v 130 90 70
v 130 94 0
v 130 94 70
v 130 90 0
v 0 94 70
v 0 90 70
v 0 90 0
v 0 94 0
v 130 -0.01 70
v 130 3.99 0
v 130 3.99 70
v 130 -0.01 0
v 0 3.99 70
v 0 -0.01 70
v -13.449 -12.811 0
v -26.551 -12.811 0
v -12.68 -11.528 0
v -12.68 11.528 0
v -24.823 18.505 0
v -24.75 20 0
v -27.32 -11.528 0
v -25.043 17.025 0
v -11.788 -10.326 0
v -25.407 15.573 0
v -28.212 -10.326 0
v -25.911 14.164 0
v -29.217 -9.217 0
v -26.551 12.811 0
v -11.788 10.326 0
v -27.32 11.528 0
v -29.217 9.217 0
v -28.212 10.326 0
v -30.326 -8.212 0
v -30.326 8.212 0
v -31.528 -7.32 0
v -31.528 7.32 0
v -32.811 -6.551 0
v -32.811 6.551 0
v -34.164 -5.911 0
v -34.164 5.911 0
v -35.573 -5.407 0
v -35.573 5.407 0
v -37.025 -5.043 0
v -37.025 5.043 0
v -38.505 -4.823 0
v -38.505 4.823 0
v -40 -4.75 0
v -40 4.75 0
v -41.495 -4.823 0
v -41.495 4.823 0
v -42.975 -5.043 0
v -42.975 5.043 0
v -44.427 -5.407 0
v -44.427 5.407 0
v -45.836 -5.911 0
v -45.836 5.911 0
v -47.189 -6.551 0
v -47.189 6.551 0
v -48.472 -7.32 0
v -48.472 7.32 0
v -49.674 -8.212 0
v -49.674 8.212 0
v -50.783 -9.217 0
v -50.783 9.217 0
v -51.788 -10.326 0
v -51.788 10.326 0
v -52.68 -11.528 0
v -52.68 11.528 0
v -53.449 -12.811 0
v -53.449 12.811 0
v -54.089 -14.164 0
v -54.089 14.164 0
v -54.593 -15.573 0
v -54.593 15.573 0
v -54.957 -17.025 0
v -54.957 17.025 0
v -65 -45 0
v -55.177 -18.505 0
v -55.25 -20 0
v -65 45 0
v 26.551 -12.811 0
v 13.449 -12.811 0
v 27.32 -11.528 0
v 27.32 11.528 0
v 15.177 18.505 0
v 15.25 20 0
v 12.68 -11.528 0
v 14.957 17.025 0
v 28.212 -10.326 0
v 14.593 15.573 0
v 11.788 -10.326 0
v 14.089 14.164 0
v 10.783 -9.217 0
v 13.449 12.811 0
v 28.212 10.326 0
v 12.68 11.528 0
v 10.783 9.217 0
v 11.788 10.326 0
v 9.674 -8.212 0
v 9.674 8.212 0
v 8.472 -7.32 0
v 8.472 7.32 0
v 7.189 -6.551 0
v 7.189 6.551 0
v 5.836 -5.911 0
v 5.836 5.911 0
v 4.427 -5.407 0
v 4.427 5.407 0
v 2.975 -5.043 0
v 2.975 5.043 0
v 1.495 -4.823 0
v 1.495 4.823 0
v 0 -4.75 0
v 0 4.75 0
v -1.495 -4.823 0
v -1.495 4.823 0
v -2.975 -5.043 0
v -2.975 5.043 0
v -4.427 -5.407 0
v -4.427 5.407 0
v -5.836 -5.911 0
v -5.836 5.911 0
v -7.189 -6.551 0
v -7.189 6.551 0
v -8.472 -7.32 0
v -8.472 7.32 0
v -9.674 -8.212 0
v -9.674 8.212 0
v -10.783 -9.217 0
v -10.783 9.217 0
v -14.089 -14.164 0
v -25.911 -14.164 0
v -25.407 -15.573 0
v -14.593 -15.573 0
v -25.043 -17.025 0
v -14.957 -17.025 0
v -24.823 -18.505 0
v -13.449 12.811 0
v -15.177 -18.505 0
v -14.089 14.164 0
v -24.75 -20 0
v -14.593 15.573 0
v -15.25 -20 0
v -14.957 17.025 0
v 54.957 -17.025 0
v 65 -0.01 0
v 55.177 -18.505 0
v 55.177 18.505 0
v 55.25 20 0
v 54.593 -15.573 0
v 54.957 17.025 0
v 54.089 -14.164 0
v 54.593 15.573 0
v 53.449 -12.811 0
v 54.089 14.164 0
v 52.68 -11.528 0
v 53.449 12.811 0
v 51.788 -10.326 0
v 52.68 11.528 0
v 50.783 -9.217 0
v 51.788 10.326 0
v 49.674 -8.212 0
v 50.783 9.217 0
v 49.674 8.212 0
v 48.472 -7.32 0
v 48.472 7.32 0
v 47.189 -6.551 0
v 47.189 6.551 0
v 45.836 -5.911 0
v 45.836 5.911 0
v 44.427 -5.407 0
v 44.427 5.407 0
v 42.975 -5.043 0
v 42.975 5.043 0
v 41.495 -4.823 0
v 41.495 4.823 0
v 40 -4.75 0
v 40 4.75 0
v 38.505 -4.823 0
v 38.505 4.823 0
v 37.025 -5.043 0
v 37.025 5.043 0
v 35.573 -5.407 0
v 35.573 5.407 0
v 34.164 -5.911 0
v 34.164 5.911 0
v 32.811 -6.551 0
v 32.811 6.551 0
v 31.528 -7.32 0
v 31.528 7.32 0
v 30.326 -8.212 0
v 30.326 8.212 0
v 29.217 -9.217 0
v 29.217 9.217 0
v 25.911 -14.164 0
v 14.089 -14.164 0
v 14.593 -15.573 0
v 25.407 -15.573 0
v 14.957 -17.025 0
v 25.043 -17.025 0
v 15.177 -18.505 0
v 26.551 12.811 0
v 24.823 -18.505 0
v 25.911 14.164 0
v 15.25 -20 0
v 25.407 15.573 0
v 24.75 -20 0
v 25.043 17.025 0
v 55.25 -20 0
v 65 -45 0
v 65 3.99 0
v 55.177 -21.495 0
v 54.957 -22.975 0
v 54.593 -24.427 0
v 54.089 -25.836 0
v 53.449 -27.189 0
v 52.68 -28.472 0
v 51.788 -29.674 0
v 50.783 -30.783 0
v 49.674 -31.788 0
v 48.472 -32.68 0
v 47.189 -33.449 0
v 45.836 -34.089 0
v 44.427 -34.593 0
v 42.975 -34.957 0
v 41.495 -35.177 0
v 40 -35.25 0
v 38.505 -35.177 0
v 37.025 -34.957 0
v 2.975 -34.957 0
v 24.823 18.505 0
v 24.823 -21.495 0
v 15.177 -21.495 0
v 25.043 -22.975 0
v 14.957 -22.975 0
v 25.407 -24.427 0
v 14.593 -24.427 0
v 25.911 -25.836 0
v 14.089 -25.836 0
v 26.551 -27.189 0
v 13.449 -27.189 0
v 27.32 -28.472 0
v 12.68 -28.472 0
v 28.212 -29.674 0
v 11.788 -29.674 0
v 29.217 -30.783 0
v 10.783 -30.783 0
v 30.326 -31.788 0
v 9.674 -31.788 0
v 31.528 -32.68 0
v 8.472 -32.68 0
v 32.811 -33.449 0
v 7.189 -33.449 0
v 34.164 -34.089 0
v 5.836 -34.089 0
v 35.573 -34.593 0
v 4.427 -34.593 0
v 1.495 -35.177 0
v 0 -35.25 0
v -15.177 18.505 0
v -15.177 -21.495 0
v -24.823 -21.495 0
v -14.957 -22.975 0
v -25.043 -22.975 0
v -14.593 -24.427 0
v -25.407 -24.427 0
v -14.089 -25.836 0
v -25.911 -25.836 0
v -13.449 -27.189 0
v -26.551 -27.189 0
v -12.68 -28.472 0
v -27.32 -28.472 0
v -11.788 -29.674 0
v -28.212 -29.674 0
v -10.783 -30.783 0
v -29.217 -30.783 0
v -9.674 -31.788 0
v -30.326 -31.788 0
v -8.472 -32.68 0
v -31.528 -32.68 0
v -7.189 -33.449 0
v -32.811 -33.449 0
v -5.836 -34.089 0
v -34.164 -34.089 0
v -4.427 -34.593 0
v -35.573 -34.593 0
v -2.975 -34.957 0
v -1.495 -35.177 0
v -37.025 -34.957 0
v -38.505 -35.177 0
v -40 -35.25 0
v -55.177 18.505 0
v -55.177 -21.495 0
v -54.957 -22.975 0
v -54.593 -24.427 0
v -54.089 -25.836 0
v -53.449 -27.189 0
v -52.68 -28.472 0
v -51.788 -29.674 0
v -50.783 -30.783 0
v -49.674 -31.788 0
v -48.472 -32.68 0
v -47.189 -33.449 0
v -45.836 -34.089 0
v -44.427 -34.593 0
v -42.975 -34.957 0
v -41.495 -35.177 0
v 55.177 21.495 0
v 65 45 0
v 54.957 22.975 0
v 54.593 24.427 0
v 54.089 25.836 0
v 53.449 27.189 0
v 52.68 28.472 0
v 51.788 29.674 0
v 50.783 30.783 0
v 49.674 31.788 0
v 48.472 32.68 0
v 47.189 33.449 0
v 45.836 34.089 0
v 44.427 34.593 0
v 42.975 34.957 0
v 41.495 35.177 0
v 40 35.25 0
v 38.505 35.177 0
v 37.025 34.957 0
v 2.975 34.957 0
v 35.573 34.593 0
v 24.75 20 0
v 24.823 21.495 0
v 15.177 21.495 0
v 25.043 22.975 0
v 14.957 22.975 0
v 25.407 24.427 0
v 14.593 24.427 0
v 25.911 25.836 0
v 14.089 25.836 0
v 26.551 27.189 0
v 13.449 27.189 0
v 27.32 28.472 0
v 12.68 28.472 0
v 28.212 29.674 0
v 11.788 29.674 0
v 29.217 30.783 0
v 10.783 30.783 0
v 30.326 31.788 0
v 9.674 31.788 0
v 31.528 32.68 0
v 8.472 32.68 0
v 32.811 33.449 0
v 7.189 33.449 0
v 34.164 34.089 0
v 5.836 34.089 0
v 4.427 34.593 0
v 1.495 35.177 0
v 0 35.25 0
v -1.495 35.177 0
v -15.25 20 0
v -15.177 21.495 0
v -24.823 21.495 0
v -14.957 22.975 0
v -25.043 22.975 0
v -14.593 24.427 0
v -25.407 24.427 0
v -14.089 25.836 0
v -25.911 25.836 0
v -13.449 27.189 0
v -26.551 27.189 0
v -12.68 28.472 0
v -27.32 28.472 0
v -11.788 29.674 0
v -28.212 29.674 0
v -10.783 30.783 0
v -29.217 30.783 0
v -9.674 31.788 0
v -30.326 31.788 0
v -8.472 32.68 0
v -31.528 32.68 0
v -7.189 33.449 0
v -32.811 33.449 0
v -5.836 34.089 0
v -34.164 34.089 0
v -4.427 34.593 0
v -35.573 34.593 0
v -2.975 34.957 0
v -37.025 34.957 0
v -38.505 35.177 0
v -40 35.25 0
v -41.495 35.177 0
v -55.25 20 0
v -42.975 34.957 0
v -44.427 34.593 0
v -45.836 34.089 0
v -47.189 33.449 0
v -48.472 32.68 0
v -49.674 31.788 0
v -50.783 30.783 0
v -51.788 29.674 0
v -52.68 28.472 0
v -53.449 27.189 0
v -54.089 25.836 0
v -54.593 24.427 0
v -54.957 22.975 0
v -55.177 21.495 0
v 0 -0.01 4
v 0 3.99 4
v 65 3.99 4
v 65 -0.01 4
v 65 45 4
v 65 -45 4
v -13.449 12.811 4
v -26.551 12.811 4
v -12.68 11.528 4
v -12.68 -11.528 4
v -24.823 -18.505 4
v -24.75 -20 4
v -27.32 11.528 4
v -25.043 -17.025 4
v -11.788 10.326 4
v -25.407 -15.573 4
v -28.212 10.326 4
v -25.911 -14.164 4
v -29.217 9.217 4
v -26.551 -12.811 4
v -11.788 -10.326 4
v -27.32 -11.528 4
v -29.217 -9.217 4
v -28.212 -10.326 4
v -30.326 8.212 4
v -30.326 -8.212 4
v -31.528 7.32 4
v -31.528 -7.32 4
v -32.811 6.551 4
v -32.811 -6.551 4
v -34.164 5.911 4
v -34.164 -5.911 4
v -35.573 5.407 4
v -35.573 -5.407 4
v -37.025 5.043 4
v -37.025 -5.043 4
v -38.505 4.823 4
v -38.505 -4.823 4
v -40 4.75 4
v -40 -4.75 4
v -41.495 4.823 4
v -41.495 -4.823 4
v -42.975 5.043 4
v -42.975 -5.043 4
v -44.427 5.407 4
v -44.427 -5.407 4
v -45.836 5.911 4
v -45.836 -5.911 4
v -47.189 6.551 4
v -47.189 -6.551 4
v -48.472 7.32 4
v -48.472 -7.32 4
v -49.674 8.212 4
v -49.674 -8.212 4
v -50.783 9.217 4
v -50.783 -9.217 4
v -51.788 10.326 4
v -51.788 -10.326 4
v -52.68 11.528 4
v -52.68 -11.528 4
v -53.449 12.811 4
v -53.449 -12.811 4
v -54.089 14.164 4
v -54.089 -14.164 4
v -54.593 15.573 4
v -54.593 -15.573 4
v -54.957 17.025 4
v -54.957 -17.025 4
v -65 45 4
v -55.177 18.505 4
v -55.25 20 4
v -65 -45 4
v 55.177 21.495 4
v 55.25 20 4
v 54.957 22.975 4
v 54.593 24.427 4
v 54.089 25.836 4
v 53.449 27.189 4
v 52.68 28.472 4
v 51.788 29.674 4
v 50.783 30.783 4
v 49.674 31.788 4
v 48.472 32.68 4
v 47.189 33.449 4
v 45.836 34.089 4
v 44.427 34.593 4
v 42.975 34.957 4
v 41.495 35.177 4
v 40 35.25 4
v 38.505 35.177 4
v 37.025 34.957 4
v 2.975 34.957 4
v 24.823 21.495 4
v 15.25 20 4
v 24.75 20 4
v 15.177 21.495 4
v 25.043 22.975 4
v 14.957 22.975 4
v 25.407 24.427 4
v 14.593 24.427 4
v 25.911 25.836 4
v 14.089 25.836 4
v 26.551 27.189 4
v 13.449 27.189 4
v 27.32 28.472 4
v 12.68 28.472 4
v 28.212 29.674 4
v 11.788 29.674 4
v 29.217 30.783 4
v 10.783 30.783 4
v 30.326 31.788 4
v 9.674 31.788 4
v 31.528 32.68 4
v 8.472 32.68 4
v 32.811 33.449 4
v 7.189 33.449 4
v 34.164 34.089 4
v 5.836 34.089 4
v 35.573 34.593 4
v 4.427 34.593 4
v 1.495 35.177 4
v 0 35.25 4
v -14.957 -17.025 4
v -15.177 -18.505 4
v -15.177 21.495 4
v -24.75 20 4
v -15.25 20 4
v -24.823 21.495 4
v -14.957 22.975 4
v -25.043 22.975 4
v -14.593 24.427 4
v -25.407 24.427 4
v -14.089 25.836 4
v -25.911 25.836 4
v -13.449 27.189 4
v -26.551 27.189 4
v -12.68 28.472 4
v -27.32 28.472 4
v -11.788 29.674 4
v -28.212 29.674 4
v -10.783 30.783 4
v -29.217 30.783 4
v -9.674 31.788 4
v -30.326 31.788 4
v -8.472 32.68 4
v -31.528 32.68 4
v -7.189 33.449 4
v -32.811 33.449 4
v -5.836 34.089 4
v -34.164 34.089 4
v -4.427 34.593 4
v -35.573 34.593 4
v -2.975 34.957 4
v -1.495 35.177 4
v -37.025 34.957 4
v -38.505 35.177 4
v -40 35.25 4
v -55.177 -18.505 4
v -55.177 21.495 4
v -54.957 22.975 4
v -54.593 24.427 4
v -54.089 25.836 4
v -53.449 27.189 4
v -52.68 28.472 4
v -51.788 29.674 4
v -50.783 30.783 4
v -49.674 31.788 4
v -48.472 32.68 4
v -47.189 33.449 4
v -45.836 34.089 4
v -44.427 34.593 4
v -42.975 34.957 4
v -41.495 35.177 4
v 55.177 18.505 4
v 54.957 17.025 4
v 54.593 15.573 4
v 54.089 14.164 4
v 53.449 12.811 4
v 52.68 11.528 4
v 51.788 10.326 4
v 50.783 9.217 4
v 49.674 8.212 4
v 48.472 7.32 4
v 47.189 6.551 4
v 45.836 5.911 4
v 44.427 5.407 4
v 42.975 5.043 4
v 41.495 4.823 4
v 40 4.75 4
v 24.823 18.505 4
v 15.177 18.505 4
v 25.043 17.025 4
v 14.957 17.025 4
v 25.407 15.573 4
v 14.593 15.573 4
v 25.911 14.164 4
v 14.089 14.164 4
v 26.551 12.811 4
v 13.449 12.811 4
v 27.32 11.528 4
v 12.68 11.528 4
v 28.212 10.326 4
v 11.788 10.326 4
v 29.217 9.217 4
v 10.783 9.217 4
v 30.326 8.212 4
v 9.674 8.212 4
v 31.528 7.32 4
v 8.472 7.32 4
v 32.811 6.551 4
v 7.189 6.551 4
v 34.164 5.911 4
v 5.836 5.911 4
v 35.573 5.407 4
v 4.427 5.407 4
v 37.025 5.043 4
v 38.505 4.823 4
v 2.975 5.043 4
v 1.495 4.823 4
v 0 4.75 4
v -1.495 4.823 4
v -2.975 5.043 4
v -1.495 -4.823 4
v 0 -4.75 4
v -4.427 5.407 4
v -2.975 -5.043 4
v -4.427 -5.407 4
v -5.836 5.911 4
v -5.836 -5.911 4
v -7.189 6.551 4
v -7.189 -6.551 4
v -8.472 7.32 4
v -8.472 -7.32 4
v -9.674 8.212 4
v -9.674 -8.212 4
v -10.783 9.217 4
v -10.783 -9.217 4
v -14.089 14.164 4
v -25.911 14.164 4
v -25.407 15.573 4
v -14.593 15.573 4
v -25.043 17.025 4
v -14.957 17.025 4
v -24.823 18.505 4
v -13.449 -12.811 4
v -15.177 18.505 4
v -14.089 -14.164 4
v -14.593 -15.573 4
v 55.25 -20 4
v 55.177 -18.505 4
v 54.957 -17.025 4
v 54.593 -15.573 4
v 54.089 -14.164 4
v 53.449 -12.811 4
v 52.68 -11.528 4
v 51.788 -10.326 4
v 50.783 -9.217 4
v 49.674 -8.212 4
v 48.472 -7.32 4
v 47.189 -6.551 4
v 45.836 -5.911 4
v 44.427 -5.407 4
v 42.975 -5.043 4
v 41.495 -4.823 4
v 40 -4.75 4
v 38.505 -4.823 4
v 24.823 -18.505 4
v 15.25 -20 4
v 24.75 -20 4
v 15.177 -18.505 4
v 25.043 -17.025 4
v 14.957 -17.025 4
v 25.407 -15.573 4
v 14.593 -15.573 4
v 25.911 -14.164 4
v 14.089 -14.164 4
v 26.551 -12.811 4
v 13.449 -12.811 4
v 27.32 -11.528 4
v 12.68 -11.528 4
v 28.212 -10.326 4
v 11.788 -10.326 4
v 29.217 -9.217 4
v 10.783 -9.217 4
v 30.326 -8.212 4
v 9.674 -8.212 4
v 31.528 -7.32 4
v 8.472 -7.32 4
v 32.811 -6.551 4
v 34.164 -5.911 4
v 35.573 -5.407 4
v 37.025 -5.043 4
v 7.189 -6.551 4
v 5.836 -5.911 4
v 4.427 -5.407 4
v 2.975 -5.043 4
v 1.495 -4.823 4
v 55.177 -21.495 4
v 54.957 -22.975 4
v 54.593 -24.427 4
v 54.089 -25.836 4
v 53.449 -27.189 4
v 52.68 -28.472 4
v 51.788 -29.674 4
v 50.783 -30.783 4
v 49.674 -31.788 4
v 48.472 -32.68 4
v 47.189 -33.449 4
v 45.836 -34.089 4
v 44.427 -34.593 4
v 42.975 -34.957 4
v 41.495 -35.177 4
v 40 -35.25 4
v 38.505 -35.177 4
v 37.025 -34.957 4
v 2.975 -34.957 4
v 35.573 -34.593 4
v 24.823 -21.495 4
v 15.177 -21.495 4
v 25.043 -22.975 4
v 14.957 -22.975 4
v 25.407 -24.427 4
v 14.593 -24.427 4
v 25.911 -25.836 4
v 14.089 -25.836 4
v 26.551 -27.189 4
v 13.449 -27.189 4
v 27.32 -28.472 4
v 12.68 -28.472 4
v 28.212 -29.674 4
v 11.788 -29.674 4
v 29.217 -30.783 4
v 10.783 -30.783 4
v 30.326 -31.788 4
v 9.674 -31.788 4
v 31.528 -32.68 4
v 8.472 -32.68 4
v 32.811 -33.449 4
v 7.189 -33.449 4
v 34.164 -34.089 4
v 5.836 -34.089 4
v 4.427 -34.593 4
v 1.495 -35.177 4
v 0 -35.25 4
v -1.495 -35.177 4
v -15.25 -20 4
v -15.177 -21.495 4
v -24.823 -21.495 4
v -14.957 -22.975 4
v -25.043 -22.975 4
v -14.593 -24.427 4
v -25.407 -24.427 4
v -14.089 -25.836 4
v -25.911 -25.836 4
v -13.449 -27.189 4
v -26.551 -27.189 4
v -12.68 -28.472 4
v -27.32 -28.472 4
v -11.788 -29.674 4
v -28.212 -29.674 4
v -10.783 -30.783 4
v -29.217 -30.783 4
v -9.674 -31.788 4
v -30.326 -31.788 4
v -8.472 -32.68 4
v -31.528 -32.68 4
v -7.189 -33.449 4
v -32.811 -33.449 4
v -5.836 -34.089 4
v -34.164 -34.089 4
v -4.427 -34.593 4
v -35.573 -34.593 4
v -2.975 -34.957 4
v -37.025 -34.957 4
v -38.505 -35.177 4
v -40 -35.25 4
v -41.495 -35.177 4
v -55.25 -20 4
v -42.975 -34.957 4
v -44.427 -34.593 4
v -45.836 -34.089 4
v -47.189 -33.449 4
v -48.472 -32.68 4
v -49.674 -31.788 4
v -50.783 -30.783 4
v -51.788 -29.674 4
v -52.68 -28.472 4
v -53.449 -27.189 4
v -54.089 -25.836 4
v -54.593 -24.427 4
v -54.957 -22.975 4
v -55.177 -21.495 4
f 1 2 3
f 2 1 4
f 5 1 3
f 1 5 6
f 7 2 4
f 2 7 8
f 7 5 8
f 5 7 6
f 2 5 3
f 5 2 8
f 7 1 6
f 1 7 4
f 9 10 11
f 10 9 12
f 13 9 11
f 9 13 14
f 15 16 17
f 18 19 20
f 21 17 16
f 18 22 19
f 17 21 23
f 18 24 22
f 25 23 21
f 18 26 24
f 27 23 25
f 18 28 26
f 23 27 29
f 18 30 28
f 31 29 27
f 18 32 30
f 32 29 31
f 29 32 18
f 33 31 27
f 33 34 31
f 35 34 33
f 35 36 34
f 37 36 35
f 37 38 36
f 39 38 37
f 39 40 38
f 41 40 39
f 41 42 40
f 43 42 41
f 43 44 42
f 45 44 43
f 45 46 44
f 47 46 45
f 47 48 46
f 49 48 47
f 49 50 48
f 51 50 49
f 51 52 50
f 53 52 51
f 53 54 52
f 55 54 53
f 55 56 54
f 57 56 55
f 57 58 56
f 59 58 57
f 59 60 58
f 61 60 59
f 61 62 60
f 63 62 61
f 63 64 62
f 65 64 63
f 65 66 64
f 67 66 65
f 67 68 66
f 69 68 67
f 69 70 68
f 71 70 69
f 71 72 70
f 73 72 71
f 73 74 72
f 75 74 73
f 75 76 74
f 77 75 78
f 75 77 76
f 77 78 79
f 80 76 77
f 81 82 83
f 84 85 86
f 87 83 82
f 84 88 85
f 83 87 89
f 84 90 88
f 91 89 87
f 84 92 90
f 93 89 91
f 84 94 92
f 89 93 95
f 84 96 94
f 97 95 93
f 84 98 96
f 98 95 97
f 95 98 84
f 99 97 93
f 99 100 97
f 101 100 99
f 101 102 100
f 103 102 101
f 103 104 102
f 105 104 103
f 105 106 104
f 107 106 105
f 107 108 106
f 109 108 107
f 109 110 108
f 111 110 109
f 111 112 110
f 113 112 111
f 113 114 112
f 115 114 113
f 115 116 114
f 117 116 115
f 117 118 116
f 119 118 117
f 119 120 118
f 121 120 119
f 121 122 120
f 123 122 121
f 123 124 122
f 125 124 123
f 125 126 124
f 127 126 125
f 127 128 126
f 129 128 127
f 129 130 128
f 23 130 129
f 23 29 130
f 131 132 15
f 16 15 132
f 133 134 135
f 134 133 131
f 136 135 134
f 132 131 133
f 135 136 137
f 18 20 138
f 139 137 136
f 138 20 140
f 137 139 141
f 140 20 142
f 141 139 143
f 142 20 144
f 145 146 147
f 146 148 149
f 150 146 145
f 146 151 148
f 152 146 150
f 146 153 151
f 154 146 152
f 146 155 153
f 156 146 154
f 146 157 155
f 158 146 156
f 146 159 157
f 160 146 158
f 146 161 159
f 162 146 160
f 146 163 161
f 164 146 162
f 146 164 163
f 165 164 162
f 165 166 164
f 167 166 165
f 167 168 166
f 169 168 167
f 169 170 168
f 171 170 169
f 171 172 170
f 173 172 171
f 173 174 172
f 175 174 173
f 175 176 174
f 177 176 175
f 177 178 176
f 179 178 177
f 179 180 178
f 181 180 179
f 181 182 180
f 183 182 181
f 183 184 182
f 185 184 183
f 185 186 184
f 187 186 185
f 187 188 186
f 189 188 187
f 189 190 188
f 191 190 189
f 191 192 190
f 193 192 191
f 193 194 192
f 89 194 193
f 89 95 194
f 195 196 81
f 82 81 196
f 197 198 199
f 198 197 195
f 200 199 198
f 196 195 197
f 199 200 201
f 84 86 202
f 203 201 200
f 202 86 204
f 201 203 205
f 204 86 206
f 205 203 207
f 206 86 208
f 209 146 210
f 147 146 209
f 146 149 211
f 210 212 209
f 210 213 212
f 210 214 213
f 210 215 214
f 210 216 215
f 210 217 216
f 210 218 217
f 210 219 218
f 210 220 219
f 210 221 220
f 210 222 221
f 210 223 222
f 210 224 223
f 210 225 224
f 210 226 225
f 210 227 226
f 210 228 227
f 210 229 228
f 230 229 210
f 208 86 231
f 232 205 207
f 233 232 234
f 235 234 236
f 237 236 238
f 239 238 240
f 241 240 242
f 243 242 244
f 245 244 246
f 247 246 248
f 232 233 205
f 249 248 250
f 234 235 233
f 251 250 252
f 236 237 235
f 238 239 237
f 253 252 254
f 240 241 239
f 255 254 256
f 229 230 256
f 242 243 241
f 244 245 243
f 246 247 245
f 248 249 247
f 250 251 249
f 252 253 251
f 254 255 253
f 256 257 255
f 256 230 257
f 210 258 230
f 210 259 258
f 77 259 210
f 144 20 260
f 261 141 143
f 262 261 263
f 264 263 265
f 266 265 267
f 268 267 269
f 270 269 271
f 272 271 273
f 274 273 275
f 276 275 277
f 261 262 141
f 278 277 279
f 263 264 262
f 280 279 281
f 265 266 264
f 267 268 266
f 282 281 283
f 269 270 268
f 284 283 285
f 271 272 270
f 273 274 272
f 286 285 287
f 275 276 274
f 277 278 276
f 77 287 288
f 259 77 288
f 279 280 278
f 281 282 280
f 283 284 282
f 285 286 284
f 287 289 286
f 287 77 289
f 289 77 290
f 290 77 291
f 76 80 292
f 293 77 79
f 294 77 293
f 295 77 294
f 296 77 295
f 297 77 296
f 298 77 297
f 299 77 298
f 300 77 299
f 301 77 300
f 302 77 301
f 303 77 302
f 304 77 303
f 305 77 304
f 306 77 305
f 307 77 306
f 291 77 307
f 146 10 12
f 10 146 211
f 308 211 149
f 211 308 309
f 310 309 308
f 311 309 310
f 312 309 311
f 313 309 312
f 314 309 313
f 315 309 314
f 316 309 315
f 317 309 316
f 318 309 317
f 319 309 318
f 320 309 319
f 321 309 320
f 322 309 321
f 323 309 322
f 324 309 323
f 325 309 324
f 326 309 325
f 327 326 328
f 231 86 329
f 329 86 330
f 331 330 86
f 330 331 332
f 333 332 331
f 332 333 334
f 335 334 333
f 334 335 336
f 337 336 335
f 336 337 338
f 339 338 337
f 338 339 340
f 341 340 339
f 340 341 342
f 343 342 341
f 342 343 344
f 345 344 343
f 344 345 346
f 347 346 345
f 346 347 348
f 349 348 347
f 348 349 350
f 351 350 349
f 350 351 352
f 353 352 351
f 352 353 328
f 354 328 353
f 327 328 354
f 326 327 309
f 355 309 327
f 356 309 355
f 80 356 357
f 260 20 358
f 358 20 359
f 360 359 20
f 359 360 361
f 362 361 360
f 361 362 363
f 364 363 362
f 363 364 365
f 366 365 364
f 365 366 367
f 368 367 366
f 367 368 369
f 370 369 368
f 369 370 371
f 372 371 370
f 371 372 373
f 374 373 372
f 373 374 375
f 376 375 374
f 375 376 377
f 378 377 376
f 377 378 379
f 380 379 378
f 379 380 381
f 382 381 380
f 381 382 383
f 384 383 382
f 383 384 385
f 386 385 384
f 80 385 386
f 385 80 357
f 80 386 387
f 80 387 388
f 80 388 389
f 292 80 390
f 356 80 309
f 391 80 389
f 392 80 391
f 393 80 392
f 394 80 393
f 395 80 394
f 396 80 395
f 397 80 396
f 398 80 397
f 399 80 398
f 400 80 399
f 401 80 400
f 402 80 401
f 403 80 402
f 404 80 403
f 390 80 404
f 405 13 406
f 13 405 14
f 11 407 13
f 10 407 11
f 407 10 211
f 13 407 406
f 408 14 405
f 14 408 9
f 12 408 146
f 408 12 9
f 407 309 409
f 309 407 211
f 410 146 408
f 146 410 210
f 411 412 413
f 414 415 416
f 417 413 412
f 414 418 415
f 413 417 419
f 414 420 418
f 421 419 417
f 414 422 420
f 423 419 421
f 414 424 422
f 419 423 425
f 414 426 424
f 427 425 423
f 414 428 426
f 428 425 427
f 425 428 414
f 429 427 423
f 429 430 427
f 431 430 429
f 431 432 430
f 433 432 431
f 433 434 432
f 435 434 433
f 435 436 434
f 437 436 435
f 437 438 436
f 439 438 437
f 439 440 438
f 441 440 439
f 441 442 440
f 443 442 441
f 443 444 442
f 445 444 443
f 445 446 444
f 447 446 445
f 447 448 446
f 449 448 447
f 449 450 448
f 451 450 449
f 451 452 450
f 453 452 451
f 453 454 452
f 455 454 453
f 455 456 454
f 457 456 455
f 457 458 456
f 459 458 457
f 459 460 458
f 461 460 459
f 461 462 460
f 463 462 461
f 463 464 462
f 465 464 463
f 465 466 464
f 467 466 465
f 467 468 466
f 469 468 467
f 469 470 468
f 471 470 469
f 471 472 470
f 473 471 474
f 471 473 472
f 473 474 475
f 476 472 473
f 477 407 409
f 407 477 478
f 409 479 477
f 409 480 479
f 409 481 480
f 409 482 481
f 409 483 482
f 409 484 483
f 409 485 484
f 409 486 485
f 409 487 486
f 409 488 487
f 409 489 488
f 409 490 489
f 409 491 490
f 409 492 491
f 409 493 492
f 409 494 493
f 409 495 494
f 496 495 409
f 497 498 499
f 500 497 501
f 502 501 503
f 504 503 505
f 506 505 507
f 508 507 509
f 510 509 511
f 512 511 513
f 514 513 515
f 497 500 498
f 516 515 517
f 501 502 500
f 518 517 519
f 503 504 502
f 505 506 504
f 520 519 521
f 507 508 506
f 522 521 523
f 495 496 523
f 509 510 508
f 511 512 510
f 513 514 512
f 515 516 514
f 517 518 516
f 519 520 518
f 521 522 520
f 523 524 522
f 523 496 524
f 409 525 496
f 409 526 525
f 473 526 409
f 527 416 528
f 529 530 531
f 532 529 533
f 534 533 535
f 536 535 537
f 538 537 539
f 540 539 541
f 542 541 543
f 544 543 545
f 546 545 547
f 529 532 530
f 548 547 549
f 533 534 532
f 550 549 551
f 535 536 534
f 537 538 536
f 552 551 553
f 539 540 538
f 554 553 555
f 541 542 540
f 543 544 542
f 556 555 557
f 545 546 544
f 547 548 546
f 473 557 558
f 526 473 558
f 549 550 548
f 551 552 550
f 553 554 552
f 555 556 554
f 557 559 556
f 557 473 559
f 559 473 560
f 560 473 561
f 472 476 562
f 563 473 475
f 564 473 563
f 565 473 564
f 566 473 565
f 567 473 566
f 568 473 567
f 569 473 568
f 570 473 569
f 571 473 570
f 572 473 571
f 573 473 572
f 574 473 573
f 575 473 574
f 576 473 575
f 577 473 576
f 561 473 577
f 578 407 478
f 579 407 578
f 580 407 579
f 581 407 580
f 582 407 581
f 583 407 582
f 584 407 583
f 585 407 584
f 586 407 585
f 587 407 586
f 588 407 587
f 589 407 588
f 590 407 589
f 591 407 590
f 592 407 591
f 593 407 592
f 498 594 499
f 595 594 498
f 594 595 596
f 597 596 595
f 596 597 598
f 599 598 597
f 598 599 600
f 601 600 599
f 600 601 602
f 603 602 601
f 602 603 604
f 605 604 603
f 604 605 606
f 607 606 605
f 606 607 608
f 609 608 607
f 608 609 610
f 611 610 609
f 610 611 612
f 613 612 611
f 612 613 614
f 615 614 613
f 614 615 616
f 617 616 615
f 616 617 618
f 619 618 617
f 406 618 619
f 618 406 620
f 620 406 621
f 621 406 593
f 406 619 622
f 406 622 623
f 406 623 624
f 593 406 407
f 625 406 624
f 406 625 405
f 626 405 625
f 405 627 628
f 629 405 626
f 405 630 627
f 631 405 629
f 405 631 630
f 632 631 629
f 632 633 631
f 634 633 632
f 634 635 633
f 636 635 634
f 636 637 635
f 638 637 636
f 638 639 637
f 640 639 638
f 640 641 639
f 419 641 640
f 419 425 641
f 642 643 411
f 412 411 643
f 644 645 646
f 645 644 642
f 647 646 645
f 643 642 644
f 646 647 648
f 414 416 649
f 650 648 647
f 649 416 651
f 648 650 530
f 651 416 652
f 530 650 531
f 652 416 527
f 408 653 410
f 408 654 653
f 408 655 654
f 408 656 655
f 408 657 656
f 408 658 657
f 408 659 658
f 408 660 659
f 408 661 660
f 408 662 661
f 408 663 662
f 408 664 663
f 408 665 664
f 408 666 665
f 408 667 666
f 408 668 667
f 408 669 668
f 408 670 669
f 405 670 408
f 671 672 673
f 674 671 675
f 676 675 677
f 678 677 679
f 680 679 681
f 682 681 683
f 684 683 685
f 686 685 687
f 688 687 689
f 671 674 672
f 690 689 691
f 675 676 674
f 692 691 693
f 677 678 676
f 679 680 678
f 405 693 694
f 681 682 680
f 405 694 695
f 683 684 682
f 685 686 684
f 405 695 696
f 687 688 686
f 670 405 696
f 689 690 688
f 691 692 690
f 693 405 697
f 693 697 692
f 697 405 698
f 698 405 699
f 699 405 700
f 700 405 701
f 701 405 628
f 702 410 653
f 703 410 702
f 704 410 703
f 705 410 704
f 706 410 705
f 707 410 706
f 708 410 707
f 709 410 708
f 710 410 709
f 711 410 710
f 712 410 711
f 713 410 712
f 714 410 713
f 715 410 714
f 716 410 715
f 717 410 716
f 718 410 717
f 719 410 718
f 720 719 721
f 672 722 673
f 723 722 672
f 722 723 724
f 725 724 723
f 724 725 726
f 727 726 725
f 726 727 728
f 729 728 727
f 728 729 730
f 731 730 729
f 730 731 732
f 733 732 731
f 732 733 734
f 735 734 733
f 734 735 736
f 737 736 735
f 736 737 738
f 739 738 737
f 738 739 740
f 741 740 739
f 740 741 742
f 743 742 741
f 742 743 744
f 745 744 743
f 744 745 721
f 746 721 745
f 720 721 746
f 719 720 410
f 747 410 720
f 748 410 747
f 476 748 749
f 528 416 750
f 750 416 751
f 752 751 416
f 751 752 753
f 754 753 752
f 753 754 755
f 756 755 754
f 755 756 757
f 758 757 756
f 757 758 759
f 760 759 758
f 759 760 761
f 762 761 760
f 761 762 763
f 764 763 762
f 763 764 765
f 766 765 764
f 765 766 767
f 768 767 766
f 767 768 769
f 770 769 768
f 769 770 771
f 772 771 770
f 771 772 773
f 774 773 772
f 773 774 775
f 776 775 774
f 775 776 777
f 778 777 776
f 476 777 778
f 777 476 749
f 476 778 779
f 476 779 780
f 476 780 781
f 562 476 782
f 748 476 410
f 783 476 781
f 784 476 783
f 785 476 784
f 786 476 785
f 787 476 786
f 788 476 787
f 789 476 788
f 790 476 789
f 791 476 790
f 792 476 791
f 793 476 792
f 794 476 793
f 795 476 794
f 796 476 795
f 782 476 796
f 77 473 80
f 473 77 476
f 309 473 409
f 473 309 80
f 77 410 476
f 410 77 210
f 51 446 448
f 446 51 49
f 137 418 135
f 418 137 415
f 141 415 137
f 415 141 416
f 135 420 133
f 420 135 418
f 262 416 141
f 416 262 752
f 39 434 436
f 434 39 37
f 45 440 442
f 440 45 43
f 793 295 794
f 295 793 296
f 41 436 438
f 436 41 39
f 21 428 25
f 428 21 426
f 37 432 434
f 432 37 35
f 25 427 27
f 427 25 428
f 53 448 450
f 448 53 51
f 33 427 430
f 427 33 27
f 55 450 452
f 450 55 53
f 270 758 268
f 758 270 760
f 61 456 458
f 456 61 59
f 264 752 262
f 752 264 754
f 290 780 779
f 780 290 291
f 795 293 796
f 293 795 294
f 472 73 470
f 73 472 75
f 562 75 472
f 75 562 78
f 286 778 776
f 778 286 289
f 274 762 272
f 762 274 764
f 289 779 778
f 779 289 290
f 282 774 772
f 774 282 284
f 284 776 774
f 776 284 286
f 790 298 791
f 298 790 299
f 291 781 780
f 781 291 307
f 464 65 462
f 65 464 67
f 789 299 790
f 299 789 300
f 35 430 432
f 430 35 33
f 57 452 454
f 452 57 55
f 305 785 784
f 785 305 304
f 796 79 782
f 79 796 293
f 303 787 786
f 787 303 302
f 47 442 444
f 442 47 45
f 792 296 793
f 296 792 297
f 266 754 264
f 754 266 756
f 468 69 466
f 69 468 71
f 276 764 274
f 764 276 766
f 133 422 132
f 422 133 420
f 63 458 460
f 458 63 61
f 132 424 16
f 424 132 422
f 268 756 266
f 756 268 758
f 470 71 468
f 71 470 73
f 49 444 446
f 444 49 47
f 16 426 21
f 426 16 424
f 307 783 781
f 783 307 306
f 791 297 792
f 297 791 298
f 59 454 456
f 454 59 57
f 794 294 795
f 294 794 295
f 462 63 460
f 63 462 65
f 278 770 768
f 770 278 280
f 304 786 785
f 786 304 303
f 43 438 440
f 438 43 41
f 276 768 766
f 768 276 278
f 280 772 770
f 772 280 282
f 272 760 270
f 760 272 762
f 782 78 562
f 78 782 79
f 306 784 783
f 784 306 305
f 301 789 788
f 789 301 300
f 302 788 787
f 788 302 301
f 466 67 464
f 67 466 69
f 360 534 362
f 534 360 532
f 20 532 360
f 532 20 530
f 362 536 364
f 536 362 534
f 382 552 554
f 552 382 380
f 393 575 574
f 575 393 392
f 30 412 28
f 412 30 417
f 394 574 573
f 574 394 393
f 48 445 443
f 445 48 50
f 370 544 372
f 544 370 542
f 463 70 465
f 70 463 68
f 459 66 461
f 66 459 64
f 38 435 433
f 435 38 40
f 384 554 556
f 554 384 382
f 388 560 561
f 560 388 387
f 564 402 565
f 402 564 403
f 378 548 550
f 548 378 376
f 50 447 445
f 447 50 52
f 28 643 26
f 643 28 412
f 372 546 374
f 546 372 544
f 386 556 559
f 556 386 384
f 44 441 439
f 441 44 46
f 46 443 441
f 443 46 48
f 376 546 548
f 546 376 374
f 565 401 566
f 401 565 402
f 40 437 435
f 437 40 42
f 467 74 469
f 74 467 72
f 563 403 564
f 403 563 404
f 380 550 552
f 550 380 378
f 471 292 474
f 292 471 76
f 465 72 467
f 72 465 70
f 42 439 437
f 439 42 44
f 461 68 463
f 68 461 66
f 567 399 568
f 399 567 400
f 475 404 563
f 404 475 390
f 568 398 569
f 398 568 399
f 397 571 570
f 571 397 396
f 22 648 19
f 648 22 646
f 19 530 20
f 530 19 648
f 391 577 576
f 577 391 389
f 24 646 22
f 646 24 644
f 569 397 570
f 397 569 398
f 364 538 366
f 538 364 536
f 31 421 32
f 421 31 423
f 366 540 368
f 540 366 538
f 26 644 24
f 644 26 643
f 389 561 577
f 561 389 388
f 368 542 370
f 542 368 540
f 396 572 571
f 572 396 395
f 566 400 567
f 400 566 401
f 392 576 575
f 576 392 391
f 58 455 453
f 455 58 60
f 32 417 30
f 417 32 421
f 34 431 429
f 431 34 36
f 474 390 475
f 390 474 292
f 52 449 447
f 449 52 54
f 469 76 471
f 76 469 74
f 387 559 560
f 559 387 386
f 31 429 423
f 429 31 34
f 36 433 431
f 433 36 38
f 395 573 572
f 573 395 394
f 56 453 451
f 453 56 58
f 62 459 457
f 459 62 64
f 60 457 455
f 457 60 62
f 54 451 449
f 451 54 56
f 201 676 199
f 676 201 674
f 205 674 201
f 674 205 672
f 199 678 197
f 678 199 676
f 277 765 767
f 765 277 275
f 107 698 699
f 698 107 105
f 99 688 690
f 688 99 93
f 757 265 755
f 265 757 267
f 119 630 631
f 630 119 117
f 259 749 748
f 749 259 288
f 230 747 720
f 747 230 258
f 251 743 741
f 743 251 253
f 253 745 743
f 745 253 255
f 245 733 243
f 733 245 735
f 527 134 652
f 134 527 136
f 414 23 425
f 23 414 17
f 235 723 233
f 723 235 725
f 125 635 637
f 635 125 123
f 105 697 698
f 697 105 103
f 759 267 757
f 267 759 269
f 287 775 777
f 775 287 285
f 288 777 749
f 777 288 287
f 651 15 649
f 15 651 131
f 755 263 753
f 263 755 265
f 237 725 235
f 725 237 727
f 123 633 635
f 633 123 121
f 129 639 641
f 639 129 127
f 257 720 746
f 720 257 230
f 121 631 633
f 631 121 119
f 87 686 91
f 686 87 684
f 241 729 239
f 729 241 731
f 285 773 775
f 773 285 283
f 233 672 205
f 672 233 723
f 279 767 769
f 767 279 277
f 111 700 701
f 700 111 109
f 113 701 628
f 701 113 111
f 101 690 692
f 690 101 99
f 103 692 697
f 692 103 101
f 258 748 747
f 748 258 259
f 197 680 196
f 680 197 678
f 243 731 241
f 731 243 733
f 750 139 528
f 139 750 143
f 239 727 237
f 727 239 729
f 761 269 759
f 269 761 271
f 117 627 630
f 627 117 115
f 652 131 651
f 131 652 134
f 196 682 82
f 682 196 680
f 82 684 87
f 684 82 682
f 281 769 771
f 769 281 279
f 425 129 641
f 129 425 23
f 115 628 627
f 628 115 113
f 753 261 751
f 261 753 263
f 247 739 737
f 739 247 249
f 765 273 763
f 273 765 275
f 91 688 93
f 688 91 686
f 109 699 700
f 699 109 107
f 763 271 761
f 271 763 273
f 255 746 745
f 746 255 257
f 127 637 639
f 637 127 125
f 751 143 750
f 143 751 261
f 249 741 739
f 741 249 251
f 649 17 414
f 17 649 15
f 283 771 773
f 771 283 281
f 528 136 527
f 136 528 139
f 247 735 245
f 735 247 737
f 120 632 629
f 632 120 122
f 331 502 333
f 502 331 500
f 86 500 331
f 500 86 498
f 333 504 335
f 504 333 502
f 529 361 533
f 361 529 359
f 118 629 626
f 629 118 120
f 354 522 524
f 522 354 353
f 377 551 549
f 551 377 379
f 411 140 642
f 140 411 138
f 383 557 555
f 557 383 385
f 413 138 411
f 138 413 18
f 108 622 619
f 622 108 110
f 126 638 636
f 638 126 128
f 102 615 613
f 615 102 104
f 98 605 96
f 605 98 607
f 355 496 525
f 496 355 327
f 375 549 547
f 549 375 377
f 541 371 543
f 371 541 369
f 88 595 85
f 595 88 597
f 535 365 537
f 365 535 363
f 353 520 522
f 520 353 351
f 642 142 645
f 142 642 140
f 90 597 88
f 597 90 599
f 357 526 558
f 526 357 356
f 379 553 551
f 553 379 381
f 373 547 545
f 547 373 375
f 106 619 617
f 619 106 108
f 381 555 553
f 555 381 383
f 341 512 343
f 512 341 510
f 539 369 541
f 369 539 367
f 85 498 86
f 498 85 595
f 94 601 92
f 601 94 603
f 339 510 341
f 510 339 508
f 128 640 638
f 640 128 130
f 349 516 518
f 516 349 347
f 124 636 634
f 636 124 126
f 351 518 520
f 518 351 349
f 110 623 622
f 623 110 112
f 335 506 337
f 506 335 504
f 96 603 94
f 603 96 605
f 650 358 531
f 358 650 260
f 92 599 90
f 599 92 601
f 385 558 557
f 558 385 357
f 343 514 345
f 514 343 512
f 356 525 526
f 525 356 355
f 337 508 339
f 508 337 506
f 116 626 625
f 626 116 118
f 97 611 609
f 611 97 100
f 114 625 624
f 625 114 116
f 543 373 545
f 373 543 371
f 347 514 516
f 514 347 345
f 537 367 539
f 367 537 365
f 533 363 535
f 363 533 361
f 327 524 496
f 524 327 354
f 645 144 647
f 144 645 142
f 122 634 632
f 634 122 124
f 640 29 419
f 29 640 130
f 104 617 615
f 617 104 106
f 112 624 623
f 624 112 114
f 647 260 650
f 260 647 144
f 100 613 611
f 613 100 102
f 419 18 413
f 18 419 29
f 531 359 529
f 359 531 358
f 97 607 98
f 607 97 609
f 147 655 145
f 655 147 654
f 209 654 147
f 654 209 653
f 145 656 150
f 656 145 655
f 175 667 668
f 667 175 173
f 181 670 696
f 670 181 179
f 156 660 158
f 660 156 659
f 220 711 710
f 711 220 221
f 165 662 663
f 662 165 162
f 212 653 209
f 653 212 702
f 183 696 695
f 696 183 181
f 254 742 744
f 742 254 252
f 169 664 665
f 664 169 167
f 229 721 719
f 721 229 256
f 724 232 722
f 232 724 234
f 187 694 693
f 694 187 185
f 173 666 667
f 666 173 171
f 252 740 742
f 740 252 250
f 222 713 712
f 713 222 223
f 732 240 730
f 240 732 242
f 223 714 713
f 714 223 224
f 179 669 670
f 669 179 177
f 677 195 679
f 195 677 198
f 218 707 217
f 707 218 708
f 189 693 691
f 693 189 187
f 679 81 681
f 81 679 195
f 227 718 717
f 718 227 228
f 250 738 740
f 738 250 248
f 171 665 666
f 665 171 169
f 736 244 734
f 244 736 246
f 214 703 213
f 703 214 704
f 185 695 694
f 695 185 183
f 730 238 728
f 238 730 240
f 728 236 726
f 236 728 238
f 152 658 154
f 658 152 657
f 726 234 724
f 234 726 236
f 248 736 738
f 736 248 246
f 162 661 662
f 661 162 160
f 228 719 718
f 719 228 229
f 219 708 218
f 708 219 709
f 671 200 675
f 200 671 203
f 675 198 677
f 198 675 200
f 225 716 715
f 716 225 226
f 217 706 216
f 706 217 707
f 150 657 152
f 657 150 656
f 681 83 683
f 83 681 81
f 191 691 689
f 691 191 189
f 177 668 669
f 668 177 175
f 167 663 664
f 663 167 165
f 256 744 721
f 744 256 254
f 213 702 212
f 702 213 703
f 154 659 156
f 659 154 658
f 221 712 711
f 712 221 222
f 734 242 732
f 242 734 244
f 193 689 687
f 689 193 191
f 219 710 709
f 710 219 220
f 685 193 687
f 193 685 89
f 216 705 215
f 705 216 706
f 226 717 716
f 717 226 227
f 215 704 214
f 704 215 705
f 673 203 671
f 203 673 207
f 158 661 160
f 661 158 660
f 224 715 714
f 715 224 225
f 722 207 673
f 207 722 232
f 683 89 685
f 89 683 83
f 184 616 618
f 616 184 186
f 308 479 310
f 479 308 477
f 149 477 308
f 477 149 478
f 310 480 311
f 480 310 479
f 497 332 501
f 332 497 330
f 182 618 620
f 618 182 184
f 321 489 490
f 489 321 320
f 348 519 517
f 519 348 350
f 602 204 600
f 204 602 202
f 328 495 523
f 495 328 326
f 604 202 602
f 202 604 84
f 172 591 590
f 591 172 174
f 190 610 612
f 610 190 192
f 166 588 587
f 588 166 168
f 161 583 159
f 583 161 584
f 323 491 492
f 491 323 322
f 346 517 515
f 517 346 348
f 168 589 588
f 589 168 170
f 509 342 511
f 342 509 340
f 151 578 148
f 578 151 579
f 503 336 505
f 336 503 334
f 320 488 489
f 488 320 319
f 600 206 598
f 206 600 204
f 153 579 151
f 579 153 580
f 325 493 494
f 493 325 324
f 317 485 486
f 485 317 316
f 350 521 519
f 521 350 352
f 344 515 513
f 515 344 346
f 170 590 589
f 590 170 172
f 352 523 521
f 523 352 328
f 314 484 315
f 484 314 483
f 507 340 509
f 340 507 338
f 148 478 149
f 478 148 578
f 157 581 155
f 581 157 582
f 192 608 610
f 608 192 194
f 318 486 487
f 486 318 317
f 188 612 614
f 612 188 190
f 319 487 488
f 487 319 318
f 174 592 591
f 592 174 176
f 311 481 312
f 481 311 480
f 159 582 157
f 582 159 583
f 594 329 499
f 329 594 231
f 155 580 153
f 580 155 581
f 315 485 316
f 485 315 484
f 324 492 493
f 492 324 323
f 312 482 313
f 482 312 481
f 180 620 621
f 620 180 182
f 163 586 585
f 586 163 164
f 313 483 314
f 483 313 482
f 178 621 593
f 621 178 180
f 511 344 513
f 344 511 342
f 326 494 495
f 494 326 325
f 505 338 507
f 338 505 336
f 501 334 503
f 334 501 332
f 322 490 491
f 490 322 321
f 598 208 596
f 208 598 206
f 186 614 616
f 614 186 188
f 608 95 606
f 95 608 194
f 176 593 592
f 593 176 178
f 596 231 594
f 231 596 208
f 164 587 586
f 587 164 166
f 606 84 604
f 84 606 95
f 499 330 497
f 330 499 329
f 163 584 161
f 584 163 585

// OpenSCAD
// Rack for six 50 mL conical (Falcon-type) tubes
// Print orientation: flat plate down, walls up. Flip after printing.

$fn = 64;

// ---- Plate ----
plate_x = 130;      // plate length (X)
plate_y = 90;       // plate width (Y)
plate_t = 4;        // plate thickness (Z)

// ---- Holes ----
hole_d     = 30.5;  // hole diameter
hole_nx    = 3;     // holes along X
hole_ny    = 2;     // holes along Y
hole_pitch = 40;    // centre-to-centre spacing (both directions)

// ---- Walls ----
wall_len = 130;     // wall length along X
wall_t   = 4;       // wall thickness along Y
wall_h   = 70;      // wall height above plate (Z)

// ---- Misc ----
eps = 0.5;          // cutter overshoot

difference() {
    union() {
        // Base plate
        translate([-plate_x/2, -plate_y/2, 0])
            cube([plate_x, plate_y, plate_t]);

        // Long-edge walls
        for (sx = [-1, 1])
            translate([sx * (plate_x/2 - wall_len/2),
                       (sx > 0) ? -0.01 : plate_y,
                       0])
                cube([wall_len, wall_t, wall_h]);
    }

    // Through-holes
    for (i = [0 : hole_nx - 1])
        for (j = [0 : hole_ny - 1])
            translate([(i - (hole_nx - 1)/2) * hole_pitch,
                       (j - (hole_ny - 1)/2) * hole_pitch,
                       -eps])
                cylinder(d = hole_d, h = plate_t + 2*eps);
}
